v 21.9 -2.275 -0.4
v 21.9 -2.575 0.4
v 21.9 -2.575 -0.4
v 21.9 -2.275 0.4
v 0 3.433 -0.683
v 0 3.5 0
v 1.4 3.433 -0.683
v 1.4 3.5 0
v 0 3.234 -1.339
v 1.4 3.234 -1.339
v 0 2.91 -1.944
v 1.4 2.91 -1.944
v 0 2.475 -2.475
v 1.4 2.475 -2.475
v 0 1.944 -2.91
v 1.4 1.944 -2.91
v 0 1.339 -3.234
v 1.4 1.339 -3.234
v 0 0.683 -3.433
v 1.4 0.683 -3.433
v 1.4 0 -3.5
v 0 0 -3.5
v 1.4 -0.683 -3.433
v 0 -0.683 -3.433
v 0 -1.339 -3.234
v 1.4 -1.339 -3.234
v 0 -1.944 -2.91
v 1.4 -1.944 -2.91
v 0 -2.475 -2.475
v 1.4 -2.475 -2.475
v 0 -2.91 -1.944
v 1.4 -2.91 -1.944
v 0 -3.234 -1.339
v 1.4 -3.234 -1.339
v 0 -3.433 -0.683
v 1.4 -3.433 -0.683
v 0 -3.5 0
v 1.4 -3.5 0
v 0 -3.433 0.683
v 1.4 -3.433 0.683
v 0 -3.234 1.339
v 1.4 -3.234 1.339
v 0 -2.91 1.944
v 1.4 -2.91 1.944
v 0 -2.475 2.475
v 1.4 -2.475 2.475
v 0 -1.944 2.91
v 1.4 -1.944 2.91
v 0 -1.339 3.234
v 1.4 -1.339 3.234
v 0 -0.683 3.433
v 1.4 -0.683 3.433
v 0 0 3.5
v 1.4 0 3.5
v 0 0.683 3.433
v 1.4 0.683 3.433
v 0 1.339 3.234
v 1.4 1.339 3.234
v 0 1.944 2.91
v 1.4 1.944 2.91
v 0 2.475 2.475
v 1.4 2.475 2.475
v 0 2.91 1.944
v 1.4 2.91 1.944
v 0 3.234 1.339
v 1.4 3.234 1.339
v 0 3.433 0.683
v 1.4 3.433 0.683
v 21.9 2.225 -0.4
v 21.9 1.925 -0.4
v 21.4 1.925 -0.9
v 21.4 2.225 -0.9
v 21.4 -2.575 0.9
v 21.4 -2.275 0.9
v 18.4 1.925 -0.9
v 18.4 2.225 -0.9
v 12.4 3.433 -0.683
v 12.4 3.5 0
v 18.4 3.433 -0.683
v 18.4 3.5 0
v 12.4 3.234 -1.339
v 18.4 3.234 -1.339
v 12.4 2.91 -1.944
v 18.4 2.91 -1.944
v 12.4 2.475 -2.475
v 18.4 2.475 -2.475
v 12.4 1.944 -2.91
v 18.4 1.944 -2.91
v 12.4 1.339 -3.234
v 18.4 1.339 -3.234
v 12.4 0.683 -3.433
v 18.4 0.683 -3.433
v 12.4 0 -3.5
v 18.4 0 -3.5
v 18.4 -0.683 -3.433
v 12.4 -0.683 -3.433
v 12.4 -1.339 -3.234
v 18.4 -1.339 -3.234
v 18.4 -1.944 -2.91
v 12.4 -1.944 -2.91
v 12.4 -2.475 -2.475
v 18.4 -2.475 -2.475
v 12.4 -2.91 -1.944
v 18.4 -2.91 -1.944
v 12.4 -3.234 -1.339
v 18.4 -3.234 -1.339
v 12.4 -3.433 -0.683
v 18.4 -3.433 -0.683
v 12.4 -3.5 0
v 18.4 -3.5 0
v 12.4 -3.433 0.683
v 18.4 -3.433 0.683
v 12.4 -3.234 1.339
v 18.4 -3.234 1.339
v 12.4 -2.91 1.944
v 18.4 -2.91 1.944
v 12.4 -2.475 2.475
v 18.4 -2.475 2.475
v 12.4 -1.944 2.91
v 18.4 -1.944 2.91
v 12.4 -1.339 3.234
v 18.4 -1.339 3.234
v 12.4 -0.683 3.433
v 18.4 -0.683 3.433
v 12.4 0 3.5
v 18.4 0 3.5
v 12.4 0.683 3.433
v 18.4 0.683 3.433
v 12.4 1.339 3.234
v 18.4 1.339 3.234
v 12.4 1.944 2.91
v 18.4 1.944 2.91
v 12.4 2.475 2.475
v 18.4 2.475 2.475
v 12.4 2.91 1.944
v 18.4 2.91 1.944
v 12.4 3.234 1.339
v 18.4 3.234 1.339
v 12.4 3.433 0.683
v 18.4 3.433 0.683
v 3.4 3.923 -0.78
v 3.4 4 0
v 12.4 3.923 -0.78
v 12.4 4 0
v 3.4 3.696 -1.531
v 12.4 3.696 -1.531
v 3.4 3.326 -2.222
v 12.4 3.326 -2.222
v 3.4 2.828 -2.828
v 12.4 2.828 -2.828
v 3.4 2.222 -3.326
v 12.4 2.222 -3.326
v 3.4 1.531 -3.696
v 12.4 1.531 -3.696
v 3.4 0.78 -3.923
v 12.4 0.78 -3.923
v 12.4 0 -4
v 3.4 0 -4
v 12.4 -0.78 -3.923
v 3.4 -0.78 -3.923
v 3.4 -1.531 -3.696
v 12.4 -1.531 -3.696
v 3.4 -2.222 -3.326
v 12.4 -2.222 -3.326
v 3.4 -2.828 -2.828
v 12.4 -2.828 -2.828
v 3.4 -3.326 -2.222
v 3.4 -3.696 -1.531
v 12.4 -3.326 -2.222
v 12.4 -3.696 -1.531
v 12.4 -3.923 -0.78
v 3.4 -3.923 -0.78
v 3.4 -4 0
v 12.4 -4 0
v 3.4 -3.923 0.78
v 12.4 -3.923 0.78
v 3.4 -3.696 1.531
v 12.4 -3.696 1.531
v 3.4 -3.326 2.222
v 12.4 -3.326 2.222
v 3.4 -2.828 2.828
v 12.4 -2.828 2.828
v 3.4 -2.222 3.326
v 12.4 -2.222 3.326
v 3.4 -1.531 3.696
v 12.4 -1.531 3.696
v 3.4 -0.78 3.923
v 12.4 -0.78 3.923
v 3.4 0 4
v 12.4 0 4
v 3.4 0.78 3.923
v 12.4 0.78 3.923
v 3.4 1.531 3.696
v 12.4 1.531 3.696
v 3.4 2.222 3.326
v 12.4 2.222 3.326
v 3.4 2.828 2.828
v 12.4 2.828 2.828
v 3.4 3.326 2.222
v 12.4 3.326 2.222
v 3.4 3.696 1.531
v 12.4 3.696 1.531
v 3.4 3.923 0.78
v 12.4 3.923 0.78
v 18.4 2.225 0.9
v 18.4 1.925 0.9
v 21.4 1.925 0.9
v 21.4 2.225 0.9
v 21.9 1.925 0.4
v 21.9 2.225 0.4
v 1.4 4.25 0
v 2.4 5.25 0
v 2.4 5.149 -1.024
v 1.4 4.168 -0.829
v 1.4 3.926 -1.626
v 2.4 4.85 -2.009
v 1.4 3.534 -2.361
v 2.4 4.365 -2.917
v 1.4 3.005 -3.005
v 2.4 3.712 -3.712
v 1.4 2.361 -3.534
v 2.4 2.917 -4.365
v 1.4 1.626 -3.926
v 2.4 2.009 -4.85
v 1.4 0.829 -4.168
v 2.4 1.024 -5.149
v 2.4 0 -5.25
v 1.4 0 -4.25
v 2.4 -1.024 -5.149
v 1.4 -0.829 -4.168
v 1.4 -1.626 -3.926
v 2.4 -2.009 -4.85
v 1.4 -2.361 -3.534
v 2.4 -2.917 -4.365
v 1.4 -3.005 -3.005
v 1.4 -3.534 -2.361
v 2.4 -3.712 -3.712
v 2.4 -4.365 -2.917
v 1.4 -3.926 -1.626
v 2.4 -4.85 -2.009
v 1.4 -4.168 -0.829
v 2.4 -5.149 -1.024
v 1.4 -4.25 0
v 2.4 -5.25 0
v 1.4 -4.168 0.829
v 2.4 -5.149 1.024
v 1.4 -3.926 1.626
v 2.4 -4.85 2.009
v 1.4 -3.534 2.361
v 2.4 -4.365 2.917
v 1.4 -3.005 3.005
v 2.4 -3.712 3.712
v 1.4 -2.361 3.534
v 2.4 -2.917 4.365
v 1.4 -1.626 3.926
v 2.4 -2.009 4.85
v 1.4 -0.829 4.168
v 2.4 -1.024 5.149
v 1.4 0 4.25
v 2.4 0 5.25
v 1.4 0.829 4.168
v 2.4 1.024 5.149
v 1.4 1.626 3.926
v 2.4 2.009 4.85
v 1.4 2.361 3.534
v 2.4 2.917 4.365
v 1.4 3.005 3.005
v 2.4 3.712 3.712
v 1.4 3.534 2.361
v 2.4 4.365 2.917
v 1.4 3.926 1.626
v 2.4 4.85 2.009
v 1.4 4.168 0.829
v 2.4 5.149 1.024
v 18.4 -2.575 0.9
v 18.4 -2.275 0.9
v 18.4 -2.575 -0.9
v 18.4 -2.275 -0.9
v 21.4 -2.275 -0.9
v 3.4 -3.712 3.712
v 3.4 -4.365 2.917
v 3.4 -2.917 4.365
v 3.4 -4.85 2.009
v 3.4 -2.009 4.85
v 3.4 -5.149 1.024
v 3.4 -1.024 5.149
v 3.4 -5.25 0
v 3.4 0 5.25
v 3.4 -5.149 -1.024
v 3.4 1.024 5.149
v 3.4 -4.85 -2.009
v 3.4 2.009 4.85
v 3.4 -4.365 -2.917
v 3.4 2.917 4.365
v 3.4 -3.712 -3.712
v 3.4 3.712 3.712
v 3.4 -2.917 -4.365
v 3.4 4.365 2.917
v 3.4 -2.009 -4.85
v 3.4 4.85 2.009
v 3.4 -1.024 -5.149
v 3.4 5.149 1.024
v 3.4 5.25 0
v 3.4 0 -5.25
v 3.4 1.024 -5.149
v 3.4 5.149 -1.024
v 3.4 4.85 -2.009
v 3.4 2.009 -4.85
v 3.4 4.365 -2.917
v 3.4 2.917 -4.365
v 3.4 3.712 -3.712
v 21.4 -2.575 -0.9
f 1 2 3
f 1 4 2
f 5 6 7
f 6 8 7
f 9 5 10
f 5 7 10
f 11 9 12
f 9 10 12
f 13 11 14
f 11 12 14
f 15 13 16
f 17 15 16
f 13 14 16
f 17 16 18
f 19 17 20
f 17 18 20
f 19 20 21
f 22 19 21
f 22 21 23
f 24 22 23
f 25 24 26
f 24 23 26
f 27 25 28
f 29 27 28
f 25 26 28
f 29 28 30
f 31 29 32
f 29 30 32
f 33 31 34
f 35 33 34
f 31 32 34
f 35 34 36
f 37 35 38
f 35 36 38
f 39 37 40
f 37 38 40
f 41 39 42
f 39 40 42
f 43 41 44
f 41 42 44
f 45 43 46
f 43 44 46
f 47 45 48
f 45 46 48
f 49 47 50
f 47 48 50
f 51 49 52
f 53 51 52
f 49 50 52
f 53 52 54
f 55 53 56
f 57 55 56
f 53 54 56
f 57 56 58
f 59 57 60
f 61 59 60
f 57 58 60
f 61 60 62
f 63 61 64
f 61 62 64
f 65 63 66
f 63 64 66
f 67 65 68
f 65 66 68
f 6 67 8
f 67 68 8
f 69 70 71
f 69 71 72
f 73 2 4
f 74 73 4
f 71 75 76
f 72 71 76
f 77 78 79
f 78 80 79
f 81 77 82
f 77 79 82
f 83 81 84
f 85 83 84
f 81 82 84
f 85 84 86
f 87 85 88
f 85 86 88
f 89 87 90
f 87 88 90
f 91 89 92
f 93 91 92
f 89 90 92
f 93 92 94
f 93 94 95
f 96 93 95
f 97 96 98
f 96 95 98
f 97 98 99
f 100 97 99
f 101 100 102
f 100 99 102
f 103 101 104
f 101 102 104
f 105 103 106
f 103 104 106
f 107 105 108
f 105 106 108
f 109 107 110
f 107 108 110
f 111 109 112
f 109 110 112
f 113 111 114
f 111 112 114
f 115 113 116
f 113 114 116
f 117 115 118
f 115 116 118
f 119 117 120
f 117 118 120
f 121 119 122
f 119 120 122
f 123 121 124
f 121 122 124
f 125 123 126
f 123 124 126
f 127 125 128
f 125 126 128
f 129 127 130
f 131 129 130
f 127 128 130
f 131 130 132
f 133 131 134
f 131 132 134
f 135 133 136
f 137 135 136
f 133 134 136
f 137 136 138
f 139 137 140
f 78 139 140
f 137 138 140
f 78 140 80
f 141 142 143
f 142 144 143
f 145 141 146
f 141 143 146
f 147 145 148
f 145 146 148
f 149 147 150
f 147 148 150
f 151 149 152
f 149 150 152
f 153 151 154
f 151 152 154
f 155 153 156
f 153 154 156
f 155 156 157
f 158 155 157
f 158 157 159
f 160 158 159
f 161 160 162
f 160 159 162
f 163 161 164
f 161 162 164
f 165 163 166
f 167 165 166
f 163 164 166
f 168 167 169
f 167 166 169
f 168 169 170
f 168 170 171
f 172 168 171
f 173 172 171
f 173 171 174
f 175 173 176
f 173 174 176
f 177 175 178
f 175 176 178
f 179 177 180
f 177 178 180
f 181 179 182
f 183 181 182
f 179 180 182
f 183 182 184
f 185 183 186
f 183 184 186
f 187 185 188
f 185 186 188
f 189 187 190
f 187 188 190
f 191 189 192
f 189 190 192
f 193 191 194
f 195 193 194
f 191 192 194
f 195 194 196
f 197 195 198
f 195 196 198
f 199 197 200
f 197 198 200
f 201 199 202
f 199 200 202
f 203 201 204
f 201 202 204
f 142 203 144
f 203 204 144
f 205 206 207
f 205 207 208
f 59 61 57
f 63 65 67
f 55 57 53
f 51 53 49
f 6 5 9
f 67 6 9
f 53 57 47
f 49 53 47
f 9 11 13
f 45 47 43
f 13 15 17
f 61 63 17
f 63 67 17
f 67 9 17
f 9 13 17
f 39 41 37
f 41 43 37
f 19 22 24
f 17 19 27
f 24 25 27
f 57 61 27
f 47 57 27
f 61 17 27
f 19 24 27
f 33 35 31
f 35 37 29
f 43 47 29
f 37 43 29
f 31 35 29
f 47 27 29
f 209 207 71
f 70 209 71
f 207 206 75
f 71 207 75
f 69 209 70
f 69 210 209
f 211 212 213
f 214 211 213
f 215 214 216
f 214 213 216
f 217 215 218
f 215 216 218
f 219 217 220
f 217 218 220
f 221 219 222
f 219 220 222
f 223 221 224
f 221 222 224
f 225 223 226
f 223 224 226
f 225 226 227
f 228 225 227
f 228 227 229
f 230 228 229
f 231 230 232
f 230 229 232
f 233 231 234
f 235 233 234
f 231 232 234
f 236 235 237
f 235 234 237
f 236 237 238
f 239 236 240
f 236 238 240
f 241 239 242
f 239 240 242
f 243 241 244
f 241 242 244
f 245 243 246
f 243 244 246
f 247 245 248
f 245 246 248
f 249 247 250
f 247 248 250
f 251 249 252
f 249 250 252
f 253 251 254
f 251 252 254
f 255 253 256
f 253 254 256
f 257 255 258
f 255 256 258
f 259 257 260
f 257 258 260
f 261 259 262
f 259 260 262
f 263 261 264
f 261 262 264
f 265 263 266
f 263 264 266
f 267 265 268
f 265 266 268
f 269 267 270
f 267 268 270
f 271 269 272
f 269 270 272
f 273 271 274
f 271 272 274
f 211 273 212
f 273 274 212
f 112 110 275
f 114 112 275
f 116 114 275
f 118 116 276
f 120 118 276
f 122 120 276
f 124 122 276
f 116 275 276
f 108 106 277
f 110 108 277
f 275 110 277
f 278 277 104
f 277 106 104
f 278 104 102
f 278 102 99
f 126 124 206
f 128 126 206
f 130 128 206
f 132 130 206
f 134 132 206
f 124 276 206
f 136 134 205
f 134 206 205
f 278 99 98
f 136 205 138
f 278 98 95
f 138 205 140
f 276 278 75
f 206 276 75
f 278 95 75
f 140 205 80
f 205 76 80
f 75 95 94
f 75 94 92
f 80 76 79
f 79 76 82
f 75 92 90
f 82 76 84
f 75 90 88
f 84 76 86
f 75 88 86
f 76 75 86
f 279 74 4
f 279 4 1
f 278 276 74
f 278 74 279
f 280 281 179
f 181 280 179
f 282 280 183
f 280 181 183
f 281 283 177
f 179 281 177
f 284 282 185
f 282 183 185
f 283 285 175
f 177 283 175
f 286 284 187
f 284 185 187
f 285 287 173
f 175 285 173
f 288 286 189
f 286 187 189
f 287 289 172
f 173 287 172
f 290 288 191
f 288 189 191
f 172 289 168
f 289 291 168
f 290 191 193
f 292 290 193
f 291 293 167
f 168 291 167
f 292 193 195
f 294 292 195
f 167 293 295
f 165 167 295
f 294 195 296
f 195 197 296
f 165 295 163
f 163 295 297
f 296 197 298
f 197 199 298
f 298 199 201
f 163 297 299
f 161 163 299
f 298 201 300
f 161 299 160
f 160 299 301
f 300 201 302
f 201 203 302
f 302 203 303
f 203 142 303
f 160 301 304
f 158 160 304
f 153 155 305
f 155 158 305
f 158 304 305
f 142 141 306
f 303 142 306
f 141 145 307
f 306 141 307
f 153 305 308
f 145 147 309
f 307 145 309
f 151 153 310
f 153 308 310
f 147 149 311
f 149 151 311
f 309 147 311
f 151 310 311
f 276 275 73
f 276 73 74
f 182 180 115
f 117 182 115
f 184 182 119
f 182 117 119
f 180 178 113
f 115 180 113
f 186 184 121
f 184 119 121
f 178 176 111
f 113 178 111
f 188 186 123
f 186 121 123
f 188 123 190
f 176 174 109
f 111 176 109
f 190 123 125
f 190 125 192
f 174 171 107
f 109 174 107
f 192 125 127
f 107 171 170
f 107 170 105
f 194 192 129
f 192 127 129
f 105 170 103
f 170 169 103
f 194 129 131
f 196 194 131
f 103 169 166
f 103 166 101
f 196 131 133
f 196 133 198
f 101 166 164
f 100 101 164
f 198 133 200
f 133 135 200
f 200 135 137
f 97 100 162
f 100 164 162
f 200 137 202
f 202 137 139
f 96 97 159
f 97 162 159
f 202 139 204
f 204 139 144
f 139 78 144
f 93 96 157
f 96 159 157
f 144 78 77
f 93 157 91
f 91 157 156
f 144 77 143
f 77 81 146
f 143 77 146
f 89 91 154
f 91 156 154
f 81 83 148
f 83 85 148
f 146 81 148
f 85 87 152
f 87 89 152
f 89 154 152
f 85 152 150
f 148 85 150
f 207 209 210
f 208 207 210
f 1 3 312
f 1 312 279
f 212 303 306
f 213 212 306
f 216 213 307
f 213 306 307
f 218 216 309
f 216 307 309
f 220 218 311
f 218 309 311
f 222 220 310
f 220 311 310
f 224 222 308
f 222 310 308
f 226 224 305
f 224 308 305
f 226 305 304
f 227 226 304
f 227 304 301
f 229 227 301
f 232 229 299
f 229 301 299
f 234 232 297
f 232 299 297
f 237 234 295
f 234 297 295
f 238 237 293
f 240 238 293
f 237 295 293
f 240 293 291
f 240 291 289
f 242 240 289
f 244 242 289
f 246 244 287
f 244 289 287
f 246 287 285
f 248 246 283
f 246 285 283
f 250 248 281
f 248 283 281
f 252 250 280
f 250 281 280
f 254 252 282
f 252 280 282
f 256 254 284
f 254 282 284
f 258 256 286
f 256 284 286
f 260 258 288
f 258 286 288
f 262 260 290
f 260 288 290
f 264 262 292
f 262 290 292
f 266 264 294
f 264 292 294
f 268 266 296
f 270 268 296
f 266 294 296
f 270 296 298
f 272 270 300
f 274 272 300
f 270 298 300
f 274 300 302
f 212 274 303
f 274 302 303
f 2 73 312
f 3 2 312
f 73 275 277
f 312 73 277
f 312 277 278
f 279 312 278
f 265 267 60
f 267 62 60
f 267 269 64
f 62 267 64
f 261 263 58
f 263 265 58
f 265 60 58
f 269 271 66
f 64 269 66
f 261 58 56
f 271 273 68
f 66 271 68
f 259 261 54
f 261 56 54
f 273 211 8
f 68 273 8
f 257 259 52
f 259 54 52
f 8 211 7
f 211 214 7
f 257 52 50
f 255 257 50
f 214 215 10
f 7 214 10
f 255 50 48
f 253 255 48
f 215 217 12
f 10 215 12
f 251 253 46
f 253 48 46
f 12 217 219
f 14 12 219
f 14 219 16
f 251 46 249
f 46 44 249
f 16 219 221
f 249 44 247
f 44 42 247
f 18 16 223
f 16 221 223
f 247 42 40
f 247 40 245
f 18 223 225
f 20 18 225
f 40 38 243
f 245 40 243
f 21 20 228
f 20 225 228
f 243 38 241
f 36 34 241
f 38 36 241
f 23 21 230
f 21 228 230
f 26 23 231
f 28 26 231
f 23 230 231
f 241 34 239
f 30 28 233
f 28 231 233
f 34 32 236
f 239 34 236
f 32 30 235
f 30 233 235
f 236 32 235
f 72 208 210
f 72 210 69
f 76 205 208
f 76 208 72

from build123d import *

# Parameters (mm, degrees)
CHAMFER_1_SIZE  = 1
SKETCH_2_W      = 1.8
SKETCH_2_H      = 0.3
EXTRUDE_1_DEPTH = 3.5
CHAMFER_2_SIZE  = 0.5


with BuildPart() as part:
    # 草图1 → 旋转1 (revolve)
    with BuildSketch(Plane.XY):
        Polygon((0, 0), (0, 3.5), (1.4, 3.5), (1.4, 5.25), (3.4, 5.25), (3.4, 4), (12.4, 4), (12.4, 3.5), (18.4, 3.5), (18.4, 0), align=None)
    revolve(axis=Axis((18.4, 0, 0), (-1, 0, 0)))

    # 倒角1
    chamfer_1_edges = [part.edges().sort_by_distance(p)[0] for p in [
        (1.4, -5.25, 0),
    ]]
    chamfer(chamfer_1_edges, length=CHAMFER_1_SIZE)

    # 草图2 → 凸台-拉伸1 (add)
    with BuildSketch(Plane(origin=(18.4, 0, 0), x_dir=(0, 0, -1), z_dir=(1, 0, 0))):
        with Locations((0, 2.075060306)):
            Rectangle(SKETCH_2_W, SKETCH_2_H)
        with Locations((0, -2.424939694)):
            Rectangle(SKETCH_2_W, SKETCH_2_H)
    extrude(amount=EXTRUDE_1_DEPTH)

    # 倒角2
    chamfer_2_edges = [part.edges().sort_by_distance(p)[0] for p in [
        (21.9, 2.075060306, 0.9),
        (21.9, 2.075060306, -0.9),
        (21.9, -2.424939694, 0.9),
        (21.9, -2.424939694, -0.9),
    ]]
    chamfer(chamfer_2_edges, length=CHAMFER_2_SIZE)


solid = part.part
